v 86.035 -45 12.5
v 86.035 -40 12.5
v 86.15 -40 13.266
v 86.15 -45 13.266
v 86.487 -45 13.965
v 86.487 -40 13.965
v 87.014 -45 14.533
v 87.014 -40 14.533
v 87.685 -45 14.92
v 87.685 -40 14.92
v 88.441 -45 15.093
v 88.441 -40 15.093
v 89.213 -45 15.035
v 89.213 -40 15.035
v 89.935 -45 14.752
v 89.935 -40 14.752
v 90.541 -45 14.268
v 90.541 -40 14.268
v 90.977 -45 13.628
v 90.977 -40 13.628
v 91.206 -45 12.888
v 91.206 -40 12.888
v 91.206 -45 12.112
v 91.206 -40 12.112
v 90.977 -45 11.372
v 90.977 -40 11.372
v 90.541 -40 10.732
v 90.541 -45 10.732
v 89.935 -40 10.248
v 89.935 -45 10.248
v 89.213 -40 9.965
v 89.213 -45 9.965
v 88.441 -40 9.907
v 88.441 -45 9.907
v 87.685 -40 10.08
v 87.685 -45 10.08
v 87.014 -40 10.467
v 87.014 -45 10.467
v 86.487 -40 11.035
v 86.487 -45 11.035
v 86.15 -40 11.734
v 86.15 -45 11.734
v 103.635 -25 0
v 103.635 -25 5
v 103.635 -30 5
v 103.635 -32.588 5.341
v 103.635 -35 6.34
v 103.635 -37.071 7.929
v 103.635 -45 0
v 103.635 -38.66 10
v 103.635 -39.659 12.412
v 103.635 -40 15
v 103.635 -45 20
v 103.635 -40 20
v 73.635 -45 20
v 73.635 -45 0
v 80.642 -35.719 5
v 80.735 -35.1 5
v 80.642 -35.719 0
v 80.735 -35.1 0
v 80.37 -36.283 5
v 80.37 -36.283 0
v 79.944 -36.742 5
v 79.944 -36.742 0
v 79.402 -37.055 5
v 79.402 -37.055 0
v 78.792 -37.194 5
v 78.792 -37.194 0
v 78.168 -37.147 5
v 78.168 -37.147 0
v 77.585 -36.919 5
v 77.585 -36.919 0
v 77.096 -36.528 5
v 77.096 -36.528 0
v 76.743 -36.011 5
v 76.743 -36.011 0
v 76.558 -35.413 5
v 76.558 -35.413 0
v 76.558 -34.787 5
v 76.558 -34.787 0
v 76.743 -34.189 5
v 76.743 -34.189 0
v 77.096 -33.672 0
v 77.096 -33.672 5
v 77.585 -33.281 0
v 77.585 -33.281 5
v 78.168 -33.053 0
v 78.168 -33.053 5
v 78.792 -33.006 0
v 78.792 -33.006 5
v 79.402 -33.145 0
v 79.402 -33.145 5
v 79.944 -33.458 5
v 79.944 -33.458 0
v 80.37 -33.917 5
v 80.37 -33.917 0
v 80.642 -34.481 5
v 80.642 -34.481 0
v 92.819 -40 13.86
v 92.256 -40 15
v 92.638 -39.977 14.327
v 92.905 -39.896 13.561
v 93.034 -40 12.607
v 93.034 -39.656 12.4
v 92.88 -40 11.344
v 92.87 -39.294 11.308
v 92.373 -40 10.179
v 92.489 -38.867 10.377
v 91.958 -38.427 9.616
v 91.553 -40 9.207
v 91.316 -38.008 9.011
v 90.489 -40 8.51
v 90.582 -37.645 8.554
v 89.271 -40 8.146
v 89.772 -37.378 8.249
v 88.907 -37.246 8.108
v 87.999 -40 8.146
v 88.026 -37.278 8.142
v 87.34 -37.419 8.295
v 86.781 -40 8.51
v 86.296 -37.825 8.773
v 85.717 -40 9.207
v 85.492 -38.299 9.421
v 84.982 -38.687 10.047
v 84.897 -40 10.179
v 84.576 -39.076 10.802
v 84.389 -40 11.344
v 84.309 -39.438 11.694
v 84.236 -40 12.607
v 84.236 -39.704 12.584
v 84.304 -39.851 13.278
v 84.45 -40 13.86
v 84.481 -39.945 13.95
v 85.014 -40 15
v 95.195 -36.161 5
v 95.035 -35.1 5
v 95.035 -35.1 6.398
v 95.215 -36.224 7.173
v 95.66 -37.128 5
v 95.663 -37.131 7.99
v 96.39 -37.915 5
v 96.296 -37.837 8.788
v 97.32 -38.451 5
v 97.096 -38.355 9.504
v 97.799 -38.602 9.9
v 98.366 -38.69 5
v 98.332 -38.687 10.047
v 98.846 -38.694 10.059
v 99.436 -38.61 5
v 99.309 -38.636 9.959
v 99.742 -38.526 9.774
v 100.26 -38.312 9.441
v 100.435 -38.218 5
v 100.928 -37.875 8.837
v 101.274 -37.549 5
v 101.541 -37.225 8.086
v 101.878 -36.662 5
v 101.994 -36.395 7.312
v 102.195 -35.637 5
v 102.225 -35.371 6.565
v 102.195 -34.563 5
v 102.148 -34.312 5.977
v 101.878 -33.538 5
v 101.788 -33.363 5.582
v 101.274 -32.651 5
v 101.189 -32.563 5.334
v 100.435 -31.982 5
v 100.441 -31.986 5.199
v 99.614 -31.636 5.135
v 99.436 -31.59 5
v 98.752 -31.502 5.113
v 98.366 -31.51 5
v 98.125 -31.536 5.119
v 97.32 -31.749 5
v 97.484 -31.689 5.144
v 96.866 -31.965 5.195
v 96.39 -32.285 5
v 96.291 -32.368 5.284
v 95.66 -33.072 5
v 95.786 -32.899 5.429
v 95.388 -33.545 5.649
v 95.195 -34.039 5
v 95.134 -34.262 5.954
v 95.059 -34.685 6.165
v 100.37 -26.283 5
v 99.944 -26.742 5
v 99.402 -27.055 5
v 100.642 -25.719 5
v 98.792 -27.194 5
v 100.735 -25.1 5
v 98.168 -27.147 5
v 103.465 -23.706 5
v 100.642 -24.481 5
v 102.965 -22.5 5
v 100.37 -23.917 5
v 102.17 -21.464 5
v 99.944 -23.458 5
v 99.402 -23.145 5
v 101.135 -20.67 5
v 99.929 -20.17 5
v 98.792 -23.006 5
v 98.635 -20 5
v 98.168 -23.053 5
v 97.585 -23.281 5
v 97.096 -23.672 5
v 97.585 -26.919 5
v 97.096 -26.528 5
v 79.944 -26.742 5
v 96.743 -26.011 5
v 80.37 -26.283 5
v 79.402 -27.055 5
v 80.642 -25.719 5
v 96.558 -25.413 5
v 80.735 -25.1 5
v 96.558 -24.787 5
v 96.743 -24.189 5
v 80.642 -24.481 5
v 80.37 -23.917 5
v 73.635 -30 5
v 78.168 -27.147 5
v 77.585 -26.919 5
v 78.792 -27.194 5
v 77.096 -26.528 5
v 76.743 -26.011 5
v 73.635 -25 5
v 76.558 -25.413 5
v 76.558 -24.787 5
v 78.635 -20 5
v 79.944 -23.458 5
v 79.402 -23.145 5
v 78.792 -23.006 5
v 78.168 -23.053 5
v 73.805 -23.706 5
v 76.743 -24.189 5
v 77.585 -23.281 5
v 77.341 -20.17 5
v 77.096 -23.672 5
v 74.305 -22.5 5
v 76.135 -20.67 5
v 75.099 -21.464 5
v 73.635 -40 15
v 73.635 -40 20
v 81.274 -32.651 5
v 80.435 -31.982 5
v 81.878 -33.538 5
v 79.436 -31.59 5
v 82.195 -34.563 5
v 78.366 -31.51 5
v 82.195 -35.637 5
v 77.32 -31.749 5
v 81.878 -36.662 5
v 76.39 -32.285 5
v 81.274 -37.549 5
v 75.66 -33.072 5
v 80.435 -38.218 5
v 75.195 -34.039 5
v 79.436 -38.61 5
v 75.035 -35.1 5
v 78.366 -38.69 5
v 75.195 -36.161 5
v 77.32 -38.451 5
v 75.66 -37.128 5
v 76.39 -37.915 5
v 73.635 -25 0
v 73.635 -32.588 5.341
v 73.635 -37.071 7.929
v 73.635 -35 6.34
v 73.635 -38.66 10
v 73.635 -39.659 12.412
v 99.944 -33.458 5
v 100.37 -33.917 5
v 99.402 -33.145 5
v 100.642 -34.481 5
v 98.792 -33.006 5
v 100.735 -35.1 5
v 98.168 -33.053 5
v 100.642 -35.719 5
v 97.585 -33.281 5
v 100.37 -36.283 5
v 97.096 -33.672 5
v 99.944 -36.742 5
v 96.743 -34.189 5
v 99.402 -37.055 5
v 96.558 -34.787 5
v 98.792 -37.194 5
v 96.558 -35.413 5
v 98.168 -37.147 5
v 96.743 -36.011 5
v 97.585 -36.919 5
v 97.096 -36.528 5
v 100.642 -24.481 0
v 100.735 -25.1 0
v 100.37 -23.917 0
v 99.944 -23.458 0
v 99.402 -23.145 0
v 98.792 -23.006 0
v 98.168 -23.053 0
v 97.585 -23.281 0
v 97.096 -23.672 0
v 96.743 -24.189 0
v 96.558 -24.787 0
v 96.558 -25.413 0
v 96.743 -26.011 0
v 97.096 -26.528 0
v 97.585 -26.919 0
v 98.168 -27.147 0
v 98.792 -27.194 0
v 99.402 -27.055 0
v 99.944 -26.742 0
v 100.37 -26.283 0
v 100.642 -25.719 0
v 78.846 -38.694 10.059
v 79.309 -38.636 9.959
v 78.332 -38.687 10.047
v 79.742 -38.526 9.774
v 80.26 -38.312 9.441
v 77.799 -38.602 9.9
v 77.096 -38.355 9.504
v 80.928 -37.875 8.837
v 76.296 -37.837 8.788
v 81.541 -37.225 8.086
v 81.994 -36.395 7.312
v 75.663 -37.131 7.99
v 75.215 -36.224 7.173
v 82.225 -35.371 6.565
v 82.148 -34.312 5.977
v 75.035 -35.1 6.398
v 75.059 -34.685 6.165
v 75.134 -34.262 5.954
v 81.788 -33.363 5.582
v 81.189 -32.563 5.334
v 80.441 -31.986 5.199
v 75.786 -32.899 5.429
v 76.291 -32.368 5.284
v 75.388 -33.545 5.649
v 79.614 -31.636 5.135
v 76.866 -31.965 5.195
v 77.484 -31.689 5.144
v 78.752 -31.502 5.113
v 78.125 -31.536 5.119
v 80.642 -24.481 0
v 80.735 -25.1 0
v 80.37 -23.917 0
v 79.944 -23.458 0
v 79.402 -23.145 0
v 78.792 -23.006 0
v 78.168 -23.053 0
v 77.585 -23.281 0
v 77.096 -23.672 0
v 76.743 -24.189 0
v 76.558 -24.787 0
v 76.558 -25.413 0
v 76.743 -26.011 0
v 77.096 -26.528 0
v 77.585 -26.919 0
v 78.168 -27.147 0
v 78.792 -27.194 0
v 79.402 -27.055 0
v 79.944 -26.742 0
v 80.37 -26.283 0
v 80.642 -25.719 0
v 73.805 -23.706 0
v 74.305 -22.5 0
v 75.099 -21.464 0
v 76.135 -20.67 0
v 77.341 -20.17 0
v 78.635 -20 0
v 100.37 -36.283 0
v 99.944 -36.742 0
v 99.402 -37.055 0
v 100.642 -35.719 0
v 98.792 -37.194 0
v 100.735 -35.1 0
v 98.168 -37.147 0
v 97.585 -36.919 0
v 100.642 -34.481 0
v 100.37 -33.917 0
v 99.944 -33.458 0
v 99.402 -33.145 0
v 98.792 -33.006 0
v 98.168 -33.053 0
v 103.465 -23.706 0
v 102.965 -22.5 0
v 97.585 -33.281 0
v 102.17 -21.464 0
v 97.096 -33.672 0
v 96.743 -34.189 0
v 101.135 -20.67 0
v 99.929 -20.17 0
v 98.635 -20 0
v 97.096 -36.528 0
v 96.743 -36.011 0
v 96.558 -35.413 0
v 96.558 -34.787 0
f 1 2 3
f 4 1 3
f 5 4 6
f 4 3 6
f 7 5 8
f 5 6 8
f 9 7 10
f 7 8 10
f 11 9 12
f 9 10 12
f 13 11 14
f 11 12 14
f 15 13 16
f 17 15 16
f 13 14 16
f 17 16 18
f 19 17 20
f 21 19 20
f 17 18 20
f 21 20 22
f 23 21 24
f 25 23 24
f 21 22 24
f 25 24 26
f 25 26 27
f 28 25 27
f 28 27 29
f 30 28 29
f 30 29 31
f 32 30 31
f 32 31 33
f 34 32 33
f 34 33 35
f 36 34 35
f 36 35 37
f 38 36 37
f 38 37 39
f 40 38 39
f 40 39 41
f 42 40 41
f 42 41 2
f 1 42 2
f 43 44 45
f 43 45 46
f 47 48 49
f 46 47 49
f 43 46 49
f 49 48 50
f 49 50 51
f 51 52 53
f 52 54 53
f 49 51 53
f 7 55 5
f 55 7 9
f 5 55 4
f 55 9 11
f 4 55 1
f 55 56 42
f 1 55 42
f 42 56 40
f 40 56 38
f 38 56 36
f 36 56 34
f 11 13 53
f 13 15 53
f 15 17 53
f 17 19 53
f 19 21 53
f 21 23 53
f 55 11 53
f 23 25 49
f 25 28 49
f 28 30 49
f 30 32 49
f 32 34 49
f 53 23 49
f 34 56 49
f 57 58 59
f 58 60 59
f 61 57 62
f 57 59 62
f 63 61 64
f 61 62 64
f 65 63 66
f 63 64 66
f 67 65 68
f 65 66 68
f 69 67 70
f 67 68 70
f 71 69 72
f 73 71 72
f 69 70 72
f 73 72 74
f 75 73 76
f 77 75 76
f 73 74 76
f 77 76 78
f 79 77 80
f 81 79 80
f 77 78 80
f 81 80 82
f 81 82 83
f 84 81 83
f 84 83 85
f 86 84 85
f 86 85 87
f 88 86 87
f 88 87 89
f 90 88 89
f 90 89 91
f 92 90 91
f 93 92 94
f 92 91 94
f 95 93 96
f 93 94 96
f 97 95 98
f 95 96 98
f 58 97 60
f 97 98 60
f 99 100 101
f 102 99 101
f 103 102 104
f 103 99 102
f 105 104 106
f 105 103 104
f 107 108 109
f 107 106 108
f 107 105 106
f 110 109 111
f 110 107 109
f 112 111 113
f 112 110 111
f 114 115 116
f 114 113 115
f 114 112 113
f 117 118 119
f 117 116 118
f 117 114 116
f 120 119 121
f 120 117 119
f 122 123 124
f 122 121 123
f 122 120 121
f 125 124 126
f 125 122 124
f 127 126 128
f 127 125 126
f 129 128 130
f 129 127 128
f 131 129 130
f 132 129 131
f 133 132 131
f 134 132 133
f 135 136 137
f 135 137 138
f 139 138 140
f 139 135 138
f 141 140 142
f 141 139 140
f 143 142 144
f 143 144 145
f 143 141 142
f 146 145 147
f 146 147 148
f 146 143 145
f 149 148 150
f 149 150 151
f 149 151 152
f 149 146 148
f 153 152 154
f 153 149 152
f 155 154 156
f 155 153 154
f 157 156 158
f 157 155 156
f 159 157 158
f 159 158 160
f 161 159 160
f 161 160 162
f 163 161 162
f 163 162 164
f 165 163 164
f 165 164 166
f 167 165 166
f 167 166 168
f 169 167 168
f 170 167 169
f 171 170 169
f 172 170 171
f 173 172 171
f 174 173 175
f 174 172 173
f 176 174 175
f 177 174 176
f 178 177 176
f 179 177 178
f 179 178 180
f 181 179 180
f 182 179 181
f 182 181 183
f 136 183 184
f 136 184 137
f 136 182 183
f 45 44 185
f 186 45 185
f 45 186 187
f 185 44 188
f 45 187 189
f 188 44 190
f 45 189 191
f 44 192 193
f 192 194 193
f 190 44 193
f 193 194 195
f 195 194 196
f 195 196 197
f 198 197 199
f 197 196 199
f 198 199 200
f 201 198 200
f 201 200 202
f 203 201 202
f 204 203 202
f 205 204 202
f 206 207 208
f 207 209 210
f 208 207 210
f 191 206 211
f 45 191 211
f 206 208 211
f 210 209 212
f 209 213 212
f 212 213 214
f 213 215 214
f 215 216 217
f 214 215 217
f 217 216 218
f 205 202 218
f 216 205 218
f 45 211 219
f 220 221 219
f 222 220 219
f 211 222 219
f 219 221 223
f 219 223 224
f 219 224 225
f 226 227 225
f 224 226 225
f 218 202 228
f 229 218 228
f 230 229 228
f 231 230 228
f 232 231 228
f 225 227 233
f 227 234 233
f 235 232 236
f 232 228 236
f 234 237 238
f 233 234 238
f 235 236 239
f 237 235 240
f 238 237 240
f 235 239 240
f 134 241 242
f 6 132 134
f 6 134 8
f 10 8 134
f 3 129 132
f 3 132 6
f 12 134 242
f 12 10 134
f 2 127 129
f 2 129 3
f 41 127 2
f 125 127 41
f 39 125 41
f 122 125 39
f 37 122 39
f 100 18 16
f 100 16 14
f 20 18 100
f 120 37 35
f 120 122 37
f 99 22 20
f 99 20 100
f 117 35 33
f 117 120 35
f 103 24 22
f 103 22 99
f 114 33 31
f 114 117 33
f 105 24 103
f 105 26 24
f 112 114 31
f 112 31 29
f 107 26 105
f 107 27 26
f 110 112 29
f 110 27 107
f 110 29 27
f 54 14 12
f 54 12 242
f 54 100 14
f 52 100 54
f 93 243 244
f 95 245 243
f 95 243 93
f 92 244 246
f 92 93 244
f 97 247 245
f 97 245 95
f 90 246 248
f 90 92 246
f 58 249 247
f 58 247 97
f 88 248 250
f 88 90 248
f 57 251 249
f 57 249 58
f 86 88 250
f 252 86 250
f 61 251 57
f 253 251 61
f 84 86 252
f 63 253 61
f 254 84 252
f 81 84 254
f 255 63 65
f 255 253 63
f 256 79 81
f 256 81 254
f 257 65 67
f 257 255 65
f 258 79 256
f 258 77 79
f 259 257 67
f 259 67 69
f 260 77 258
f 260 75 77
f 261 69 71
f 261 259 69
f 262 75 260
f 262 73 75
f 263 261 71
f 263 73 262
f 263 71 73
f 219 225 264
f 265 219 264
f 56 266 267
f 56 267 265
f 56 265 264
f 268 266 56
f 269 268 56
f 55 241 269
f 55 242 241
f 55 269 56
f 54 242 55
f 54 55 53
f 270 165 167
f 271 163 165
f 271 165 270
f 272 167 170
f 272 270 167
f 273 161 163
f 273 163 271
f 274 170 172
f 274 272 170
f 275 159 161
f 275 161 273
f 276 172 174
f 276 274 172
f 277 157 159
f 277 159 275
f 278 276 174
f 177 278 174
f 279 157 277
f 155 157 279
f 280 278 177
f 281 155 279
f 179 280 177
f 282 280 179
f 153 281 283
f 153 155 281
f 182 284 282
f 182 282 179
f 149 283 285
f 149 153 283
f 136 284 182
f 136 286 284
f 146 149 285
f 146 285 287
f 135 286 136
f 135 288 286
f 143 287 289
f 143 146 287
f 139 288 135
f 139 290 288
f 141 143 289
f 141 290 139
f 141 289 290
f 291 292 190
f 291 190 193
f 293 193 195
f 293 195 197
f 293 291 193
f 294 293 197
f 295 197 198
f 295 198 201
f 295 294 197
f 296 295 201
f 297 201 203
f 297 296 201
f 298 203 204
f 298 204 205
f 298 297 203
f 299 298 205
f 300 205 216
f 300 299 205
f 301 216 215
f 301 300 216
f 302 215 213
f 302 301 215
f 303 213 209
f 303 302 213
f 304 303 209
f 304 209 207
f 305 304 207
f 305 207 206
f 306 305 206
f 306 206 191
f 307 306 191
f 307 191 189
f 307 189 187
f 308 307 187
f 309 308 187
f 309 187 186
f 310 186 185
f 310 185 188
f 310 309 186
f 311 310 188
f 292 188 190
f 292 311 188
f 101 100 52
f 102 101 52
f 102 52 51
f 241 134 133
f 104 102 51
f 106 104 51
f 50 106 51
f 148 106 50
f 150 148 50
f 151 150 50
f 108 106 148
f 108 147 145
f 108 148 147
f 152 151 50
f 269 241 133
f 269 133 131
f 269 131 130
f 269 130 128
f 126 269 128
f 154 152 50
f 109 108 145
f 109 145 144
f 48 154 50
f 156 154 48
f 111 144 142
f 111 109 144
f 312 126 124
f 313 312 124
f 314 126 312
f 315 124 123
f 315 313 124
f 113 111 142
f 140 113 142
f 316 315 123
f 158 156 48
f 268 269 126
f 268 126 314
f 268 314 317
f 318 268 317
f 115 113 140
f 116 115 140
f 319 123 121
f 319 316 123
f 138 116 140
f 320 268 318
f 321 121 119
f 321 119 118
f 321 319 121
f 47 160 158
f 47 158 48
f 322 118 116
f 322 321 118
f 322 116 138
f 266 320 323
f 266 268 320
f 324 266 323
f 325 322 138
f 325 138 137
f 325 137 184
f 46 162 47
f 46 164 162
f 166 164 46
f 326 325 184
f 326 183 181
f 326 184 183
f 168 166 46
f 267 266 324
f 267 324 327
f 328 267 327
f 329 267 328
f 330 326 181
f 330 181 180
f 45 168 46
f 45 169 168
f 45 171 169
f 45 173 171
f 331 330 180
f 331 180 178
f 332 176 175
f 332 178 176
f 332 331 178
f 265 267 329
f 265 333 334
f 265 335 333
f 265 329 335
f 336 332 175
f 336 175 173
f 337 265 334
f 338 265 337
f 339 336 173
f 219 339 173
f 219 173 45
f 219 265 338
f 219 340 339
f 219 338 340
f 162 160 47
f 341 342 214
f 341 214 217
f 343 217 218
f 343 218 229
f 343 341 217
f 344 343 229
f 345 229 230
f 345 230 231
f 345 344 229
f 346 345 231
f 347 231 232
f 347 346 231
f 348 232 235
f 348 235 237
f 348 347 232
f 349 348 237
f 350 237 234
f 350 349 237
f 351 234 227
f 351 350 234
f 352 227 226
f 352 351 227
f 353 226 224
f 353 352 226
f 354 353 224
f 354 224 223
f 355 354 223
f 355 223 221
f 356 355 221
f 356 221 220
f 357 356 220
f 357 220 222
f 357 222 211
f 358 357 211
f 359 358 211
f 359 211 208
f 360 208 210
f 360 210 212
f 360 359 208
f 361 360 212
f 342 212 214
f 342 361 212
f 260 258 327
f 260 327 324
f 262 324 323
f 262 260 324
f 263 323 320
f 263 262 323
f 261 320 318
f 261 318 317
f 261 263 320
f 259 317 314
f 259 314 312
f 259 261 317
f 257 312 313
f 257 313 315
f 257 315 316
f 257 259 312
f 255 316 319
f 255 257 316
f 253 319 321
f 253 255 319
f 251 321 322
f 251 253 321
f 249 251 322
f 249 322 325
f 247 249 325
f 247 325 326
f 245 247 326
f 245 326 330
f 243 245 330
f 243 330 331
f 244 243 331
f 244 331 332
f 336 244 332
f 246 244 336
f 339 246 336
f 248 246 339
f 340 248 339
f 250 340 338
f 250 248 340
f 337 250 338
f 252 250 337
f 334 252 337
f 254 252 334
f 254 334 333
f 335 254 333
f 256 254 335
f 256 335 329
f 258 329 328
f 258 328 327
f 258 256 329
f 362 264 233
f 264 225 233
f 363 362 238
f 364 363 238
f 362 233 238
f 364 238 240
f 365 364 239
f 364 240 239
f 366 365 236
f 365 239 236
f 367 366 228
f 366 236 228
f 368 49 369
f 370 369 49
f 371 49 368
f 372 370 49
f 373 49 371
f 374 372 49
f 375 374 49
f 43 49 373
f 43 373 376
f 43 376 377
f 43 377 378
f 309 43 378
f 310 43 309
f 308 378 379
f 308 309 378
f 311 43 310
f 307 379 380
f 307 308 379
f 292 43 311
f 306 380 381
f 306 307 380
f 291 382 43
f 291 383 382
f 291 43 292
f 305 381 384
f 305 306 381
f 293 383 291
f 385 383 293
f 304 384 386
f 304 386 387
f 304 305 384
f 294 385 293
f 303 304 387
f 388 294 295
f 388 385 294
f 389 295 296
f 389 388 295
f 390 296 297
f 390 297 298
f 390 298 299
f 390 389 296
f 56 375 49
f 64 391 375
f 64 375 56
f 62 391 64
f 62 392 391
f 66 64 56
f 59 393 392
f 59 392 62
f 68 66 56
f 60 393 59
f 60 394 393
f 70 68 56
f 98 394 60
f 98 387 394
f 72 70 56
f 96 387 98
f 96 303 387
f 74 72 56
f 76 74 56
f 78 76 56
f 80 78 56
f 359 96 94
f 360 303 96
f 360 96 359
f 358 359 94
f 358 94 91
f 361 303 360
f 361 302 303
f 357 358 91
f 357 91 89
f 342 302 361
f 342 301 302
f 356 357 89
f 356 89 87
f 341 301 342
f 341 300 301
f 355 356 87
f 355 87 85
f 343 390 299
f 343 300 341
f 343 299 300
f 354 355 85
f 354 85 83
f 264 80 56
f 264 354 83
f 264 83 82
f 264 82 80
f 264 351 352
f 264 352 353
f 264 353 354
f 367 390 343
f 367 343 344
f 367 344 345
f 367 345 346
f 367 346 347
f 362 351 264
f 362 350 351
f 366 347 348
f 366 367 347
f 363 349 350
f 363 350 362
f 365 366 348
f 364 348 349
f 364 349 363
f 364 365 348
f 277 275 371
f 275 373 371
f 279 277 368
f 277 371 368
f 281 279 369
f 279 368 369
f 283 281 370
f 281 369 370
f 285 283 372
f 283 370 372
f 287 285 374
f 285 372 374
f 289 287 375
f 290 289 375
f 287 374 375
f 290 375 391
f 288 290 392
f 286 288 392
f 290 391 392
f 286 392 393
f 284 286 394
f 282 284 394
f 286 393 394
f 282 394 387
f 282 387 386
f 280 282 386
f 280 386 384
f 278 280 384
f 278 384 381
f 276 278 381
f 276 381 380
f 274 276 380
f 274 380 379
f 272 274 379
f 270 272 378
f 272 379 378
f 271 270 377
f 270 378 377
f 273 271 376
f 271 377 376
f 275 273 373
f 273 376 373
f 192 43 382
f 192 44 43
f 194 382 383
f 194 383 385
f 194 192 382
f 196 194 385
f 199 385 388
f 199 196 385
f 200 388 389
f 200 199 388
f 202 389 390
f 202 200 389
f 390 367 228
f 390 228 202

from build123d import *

# Parameters (mm, degrees)
SKETCH1_R           = 2.1
BOSS_EXTRUDE1_DEPTH = 5
SKETCH3_W           = 30
SKETCH3_H           = 5
BOSS_EXTRUDE2_DEPTH = 15
FILLET1_R           = 5
SKETCH4_R           = 2.6
CUT_EXTRUDE2_DEPTH  = 108.425323176
FILLET2_R           = 10
SKETCH5_R           = 4.4
CUT_EXTRUDE3_DEPTH  = 108.425323272
SKETCH2_R           = 3.6
CUT_EXTRUDE4_DEPTH  = 114.974558916


with BuildPart() as part:
    # Sketch1 → Boss-Extrude1 (new body)
    with BuildSketch(Plane.XY):
        Polygon((73.634936481, -21), (73.634936481, -20), (103.634936481, -20), (103.634936481, -21), (103.634936481, -45), (73.634936481, -45), align=None)
        with Locations((98.634936481, -35.1)):
            Circle(SKETCH1_R, mode=Mode.SUBTRACT)
        with Locations((78.634936481, -35.1)):
            Circle(SKETCH1_R, mode=Mode.SUBTRACT)
        with Locations((98.634936481, -25.1)):
            Circle(SKETCH1_R, mode=Mode.SUBTRACT)
        with Locations((78.634936481, -25.1)):
            Circle(SKETCH1_R, mode=Mode.SUBTRACT)
    extrude(amount=BOSS_EXTRUDE1_DEPTH)

    # Sketch3 → Boss-Extrude2 (add)
    with BuildSketch(Plane.XY.offset(5)):
        with Locations((88.634936481, -42.5)):
            Rectangle(SKETCH3_W, SKETCH3_H)
    extrude(amount=BOSS_EXTRUDE2_DEPTH)

    # Fillet1
    fillet1_edges = [part.edges().sort_by_distance(p)[0] for p in [
        (103.634936481, -20, 2.5),
        (73.634936481, -20, 2.5),
    ]]
    fillet(fillet1_edges, radius=FILLET1_R)

    # Sketch4 → Cut-Extrude2 (cut, through all)
    with BuildSketch(Plane(origin=(0, -40, 0), x_dir=(1, 0, 0), z_dir=(0, 1, 0))):
        with Locations(Location((88.634936481, -12.5, 0), (0, 0, 180))):
            Circle(SKETCH4_R)
    extrude(amount=-CUT_EXTRUDE2_DEPTH, mode=Mode.SUBTRACT)

    # Fillet2
    # the kernel refuses this fillet: 10 mm, written as the material it adds along each edge
    with BuildSketch(Plane(origin=(73.634936481, -40, 5), x_dir=(0, 1, 0), z_dir=(1, 0, 0))) as fillet2_piece_1_section:
        with BuildLine():
            CenterArc((FILLET2_R, FILLET2_R), FILLET2_R, 180, 90)
            Line((0, FILLET2_R), (0, 0))
            Line((0, 0), (FILLET2_R, 0))
        make_face()
    fillet2_piece_1 = extrude(amount=30, mode=Mode.PRIVATE)
    fillet2_piece_1 = fillet2_piece_1 - Plane(origin=(98.634936481, -35.1, 7.280397509), x_dir=(1, 0, 0), z_dir=(0, 0, -1)) * Cylinder(2.1, 100, mode=Mode.PRIVATE)
    fillet2_piece_1 = fillet2_piece_1 - Plane(origin=(78.634936481, -35.1, 7.280397509), x_dir=(1, 0, 0), z_dir=(0, 0, -1)) * Cylinder(2.1, 100, mode=Mode.PRIVATE)
    fillet2_piece_1 = fillet2_piece_1 - Plane(origin=(88.634936481, -37.846705327, 12.5), x_dir=(-1, 0, 0), z_dir=(0, 1, 0)) * Cylinder(2.6, 100, mode=Mode.PRIVATE)
    add(fillet2_piece_1)

    # Sketch5 → Cut-Extrude3 (cut, through all)
    with BuildSketch(Plane(origin=(0, -40, 0), x_dir=(1, 0, 0), z_dir=(0, 1, 0))):
        with Locations((88.634936481, -12.5)):
            Circle(SKETCH5_R)
    extrude(amount=CUT_EXTRUDE3_DEPTH, mode=Mode.SUBTRACT)

    # Sketch2 → Cut-Extrude4 (cut, through all)
    with BuildSketch(Plane.XY.offset(5)):
        with Locations((98.634936481, -25.1)):
            Circle(SKETCH2_R)
        with Locations(Location((98.634936481, -35.1, 0), (0, 0, 180))):
            Circle(SKETCH2_R)
        with Locations((78.634936481, -25.1)):
            Circle(SKETCH2_R)
        with Locations(Location((78.634936481, -35.1, 0), (0, 0, 180))):
            Circle(SKETCH2_R)
    extrude(amount=CUT_EXTRUDE4_DEPTH, mode=Mode.SUBTRACT)


solid = part.part
